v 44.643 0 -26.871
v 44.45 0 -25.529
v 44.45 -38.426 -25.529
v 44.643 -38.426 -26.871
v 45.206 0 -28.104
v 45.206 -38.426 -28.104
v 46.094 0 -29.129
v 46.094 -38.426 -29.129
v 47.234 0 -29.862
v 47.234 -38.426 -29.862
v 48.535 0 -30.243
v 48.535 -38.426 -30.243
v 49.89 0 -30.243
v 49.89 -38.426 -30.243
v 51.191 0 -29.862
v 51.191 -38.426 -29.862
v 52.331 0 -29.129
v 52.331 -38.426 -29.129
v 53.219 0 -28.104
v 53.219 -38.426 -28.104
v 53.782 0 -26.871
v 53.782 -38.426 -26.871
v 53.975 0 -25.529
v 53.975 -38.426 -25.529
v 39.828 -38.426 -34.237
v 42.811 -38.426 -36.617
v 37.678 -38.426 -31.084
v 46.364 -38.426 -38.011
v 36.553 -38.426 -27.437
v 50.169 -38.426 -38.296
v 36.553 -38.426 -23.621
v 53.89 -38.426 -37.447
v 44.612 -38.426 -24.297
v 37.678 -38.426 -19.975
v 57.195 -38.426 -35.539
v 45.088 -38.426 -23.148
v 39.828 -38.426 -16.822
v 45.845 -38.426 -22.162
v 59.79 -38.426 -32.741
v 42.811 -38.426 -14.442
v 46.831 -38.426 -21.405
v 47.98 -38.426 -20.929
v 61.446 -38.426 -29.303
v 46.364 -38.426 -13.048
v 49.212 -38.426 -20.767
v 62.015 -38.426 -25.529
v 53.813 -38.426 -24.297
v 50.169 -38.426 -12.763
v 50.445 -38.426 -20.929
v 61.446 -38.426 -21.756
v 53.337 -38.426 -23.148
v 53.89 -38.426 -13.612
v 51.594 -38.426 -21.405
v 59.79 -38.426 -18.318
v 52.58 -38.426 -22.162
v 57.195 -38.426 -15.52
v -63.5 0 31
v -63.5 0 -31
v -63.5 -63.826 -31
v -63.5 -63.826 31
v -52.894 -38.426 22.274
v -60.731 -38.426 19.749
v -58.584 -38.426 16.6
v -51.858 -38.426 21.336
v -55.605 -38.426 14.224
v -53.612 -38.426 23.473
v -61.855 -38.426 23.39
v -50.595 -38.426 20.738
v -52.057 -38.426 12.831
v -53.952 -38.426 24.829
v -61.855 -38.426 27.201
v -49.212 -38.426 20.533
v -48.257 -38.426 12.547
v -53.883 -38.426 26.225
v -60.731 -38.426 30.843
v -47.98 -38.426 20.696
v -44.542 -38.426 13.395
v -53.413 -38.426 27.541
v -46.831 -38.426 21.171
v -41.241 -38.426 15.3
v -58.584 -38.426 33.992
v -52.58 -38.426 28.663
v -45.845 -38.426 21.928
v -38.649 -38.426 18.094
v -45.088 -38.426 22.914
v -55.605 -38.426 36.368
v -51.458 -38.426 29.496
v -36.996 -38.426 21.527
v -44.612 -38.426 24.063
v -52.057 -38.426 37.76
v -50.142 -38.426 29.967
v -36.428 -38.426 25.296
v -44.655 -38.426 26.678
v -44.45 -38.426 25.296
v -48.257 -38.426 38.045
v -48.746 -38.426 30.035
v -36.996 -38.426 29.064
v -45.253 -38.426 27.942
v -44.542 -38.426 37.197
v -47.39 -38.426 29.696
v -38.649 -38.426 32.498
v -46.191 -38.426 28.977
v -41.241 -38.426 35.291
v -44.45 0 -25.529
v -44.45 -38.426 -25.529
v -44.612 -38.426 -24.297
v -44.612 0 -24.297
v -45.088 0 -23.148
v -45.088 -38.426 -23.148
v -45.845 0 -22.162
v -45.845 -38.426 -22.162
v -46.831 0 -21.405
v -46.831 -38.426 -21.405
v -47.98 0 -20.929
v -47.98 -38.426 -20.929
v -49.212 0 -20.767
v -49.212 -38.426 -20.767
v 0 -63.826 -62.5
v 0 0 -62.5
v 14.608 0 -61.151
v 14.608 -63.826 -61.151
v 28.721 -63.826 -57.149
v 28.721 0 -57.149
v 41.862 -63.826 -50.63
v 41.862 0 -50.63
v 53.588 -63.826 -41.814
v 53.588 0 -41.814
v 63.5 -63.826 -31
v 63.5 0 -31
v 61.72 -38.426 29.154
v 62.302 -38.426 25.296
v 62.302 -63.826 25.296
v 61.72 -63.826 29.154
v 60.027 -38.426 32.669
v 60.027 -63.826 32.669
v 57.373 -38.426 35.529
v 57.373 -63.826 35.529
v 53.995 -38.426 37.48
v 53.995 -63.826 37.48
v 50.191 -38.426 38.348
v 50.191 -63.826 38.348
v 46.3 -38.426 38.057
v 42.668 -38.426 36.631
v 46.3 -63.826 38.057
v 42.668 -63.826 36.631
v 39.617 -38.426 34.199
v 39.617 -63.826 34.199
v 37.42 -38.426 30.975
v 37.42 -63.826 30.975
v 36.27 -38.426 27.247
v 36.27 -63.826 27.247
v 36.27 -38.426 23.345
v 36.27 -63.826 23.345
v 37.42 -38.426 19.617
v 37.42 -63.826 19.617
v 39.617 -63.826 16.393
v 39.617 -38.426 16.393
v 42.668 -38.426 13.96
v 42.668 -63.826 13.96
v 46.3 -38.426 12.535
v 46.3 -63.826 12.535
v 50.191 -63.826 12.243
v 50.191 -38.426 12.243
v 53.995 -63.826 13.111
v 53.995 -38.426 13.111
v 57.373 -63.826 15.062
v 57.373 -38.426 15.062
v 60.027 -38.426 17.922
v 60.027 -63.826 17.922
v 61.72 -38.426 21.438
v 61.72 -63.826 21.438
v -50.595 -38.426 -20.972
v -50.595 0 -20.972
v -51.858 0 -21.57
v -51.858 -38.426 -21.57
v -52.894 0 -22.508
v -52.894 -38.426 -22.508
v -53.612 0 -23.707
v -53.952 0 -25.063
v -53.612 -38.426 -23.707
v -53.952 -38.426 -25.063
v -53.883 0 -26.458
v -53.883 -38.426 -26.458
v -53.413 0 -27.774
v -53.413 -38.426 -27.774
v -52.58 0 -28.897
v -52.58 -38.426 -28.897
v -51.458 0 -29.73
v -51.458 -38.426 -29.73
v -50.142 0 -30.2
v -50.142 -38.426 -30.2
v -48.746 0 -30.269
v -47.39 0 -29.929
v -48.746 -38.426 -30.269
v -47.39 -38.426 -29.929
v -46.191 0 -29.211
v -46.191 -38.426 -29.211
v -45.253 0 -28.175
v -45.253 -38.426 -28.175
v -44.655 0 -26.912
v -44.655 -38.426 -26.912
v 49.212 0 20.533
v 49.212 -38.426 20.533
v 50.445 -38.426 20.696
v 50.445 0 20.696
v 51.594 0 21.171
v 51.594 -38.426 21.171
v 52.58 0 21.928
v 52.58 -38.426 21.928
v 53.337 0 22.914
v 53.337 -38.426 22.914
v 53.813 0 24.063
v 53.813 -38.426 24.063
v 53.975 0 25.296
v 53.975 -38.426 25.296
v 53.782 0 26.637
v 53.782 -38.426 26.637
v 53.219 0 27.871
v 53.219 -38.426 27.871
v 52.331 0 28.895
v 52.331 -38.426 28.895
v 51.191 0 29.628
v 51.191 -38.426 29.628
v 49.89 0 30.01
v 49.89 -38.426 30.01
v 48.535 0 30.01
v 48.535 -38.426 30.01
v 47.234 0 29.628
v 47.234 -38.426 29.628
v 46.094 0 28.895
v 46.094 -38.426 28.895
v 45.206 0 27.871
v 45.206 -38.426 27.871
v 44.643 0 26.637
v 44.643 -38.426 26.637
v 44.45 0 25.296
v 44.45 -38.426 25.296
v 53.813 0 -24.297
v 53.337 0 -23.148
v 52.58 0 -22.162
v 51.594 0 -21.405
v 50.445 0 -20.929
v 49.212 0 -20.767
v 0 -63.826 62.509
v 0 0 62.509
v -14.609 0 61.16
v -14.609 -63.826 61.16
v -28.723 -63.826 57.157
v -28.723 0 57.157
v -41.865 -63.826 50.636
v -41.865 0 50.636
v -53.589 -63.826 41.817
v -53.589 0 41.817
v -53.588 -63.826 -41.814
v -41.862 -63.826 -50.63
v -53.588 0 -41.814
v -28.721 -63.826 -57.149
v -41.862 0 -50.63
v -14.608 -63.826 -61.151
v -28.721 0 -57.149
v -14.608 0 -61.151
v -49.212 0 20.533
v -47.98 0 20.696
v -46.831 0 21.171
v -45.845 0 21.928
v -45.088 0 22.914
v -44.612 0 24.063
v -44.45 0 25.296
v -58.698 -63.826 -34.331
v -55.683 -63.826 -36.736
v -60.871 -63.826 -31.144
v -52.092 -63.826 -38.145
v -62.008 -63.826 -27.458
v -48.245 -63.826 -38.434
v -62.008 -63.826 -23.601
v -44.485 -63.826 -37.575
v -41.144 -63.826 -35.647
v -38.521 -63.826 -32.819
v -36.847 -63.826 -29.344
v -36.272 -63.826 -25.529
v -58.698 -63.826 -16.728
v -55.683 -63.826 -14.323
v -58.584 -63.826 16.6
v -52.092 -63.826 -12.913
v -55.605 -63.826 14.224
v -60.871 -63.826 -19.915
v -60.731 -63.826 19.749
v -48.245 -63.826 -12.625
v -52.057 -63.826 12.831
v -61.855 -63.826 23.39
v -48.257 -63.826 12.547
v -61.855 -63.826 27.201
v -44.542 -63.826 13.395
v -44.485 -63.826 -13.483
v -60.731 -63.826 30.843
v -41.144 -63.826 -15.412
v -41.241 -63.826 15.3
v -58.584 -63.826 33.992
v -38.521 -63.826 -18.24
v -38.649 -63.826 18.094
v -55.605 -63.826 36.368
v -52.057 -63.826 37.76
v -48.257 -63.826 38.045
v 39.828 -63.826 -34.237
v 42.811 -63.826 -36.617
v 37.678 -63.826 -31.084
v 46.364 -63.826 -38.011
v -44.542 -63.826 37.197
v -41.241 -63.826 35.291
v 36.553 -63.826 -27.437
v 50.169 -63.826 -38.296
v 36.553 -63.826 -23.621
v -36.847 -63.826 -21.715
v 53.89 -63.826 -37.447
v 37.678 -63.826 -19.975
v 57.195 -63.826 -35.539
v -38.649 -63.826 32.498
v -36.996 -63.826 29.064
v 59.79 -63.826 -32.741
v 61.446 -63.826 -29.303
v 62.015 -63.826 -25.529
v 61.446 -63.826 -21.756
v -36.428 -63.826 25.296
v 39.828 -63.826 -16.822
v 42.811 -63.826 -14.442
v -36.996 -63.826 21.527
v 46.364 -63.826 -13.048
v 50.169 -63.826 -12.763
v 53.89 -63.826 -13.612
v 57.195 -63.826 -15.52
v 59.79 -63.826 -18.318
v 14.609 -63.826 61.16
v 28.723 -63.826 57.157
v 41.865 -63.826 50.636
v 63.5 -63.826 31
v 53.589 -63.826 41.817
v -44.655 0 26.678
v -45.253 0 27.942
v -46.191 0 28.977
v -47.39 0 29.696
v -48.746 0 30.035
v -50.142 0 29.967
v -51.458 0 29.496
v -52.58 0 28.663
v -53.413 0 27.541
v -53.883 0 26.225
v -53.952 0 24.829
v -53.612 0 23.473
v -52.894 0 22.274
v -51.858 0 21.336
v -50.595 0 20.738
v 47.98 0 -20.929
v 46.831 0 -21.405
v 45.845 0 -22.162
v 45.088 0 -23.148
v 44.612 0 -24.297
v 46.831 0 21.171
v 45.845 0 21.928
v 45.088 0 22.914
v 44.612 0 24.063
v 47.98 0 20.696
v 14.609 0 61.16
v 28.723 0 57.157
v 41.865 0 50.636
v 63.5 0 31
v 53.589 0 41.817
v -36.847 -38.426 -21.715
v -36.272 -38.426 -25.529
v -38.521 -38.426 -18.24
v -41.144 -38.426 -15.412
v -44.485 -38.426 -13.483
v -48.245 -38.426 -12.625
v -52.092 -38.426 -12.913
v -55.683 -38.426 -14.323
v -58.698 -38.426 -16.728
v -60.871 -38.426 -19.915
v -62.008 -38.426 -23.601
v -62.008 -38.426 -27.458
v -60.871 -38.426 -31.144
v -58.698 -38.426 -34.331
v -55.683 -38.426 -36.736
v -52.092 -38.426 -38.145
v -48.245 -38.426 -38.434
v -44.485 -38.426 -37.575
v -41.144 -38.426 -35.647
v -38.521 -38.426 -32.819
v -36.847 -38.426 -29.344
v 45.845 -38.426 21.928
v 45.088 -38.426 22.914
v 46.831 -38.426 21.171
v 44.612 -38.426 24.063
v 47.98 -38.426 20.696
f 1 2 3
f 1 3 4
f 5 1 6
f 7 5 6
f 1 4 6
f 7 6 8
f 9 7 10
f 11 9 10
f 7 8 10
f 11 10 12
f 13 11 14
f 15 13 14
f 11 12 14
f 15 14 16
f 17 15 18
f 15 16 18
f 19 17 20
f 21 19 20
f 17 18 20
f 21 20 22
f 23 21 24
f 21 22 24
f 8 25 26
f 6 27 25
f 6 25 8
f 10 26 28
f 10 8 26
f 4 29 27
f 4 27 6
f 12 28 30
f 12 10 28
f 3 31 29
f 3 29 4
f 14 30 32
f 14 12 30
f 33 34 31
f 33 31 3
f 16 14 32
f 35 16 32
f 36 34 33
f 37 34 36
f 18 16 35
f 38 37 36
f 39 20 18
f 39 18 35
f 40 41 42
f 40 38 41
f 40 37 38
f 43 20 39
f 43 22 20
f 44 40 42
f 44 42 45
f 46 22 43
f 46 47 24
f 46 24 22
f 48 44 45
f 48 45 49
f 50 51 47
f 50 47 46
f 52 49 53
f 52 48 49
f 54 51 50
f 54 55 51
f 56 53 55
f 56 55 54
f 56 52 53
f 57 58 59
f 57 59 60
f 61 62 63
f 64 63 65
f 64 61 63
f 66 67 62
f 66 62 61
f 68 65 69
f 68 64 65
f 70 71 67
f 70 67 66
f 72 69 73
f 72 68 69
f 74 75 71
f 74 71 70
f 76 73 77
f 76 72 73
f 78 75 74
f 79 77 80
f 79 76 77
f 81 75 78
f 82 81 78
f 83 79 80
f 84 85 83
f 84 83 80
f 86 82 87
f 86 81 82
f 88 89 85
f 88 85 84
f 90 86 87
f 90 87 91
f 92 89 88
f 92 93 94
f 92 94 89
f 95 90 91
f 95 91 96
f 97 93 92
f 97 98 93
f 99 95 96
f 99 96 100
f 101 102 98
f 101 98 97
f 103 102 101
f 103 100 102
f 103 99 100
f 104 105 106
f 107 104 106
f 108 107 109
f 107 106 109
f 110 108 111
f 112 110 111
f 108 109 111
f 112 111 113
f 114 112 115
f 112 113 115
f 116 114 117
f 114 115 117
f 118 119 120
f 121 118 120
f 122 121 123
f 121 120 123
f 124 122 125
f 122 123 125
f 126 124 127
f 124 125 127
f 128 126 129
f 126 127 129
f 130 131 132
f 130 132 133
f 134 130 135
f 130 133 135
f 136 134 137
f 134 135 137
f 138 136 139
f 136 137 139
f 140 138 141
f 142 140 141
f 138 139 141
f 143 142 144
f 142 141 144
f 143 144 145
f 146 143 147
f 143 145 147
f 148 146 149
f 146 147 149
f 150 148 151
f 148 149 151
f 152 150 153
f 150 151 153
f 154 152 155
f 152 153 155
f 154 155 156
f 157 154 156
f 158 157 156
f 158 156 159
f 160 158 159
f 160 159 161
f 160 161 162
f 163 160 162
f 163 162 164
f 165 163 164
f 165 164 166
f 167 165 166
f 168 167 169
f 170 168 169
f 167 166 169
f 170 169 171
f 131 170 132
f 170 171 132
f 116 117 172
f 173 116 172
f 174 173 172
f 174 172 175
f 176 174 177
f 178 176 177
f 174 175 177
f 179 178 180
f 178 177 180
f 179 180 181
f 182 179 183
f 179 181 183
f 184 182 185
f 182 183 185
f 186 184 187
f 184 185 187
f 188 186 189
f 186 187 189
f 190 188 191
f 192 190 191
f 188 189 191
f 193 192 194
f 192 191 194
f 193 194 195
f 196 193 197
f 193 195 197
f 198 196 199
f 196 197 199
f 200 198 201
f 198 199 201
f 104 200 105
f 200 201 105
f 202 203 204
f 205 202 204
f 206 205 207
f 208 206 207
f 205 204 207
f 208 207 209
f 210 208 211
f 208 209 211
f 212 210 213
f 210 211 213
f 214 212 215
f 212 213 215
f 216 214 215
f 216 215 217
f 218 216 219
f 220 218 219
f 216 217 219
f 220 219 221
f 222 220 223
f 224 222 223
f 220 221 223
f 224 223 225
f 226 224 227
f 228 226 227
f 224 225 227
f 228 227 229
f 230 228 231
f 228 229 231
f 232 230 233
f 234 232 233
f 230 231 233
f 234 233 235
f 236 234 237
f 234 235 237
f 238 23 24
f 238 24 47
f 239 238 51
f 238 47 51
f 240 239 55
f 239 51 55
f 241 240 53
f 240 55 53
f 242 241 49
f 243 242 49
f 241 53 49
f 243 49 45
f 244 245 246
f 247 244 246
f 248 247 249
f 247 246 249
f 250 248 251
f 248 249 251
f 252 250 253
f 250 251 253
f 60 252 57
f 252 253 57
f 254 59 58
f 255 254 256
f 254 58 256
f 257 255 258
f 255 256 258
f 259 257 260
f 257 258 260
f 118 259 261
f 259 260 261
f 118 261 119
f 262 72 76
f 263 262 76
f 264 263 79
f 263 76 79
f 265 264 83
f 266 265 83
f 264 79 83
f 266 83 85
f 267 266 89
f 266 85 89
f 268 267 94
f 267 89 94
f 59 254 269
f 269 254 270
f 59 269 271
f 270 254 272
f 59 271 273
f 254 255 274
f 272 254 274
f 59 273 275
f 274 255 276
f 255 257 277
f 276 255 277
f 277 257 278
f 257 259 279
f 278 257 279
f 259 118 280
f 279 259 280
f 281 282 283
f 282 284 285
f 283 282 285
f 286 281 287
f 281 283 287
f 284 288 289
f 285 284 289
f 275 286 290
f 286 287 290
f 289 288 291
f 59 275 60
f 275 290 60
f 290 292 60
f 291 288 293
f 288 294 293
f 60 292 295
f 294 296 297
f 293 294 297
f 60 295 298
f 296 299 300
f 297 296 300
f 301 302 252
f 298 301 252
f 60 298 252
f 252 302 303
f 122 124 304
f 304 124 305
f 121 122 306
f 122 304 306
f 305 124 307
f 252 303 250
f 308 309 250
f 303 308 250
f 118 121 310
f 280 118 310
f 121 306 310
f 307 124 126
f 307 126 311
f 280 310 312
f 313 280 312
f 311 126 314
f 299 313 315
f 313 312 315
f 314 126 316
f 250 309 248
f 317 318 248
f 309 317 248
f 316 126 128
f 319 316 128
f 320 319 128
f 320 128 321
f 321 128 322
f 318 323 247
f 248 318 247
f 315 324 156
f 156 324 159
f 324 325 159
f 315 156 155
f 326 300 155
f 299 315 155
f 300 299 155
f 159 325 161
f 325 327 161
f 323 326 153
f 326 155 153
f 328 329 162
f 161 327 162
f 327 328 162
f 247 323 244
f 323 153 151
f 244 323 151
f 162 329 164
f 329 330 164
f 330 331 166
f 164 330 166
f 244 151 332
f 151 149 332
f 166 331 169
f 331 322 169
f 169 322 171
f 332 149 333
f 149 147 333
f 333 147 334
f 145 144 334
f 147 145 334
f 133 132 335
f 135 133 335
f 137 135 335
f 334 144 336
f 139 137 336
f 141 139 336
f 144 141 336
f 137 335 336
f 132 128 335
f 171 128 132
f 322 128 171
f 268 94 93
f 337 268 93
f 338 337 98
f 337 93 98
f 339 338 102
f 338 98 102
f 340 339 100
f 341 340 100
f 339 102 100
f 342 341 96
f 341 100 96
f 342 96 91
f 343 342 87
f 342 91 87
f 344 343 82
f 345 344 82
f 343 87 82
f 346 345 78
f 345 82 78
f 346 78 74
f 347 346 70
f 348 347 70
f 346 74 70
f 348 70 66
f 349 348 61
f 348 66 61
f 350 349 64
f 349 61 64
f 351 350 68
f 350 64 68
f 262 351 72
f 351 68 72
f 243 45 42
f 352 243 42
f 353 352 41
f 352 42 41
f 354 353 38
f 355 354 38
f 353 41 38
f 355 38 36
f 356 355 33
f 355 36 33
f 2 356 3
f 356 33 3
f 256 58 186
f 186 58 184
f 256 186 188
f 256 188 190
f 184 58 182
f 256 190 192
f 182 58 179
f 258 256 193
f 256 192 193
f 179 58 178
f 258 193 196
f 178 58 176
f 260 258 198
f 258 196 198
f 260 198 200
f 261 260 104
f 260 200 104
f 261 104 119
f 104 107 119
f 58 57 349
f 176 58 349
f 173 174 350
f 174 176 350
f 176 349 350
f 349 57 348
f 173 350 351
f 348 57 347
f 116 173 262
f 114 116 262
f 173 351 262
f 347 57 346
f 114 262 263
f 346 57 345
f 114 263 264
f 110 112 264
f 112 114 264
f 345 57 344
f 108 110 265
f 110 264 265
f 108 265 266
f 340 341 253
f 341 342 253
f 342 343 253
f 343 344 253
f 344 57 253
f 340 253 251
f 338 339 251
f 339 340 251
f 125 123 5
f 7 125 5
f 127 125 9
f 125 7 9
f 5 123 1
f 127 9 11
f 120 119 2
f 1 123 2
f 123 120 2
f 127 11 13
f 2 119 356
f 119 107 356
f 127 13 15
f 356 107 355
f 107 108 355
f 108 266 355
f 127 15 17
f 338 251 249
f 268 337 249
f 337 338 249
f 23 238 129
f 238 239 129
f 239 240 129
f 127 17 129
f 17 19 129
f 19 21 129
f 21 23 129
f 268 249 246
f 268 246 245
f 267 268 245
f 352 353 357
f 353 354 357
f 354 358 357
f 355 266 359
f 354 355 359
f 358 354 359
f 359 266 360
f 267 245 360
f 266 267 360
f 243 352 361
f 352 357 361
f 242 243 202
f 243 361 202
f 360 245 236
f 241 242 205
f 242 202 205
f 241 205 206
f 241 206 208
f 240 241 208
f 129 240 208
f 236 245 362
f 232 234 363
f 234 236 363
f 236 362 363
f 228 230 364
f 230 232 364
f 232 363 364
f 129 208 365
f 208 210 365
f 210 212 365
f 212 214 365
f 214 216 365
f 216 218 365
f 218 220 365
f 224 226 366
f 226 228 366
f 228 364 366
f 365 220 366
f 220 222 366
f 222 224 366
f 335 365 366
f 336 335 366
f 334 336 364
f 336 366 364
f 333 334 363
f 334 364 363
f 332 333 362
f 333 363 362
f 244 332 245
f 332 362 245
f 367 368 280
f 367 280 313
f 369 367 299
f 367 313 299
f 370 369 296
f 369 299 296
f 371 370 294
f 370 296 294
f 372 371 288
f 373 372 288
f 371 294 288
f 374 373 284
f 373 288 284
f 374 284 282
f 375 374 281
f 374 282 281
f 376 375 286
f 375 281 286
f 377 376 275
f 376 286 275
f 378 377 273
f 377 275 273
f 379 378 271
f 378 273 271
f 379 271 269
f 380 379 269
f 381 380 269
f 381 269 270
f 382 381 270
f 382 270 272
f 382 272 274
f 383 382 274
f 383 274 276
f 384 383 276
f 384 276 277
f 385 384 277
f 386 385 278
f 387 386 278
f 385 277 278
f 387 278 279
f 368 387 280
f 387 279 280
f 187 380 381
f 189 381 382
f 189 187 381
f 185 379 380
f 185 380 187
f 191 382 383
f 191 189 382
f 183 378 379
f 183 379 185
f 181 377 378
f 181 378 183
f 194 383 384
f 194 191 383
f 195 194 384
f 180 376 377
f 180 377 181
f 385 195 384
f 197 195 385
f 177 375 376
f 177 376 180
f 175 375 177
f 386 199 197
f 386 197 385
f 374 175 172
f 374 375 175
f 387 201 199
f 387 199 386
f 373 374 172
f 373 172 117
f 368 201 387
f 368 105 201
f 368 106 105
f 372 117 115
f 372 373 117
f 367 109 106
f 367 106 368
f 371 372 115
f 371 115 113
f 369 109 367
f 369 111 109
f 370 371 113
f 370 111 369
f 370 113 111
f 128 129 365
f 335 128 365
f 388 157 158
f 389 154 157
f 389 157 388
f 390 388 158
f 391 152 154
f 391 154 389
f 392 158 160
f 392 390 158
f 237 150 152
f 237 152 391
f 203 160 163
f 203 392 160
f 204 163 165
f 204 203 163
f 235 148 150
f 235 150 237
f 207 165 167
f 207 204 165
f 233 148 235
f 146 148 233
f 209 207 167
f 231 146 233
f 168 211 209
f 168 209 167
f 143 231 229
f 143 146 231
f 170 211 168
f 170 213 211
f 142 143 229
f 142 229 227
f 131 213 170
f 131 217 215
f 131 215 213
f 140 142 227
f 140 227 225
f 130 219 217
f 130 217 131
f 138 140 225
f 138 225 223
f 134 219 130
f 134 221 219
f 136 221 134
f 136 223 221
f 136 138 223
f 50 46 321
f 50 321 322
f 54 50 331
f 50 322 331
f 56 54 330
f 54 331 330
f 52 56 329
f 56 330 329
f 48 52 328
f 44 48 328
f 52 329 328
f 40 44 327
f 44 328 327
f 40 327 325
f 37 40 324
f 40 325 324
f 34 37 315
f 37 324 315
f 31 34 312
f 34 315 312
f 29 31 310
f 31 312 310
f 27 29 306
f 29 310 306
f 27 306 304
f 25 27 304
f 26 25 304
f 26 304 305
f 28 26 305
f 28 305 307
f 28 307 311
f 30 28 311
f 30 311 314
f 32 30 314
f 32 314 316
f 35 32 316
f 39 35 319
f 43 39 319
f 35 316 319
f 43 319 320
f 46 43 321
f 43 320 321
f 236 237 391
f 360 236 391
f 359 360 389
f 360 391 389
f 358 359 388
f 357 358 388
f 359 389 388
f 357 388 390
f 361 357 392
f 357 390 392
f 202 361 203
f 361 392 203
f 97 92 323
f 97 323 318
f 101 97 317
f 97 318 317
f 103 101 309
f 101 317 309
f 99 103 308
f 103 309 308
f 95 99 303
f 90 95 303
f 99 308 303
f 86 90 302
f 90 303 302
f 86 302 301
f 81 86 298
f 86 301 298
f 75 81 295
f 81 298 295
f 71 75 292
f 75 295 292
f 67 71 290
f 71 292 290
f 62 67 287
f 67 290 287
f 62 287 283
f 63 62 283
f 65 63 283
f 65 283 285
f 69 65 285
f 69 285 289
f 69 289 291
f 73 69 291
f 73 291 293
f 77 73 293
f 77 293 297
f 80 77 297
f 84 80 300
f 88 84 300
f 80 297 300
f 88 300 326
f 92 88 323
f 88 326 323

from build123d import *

# Parameters (mm, degrees)
F1_DEPTH  = 104.5
F3_DEPTH  = 127.001
F4_W      = 127
F4_H      = 62
F5_DEPTH  = 27
F7_DEPTH  = 93.5104
F8_W      = 78.298144
F8_H      = 207.146659
F9_DEPTH  = 127.001
F11_DEPTH = 63.827166
F12_R     = 12.802334
F12_R_2   = 12.940418
F12_R_3   = 12.784861
F12_R_4   = 13.089145
F13_DEPTH = 25.4


with BuildPart() as f1:
    # F0 (on Front) → F1 (new body)
    with BuildSketch(Plane.XZ):
        with BuildLine():
            ThreePointArc((0, 62.5094), (-35.443943, 54.198998), (-63.5, 31))
            Line((-63.5, 31), (0, 31))
            Line((0, 31), (0, 62.5094))
        make_face()
        Polygon((0, 31), (-63.5, 31), (-63.5, -31), (0, -31), (0, 0), align=None)
        with BuildLine():
            Line((0, 62.5094), (0, 31))
            Line((0, 31), (63.5, 31))
            ThreePointArc((63.5, 31), (35.443943, 54.198998), (0, 62.5094))
        make_face()
        Polygon((63.5, 31), (0, 31), (0, 0), (0, -31), (63.5, -31), align=None)
        with BuildLine():
            Line((0, -31), (-63.5, -31))
            ThreePointArc((-63.5, -31), (-35.441854, -54.192308), (0, -62.5))
            Line((0, -62.5), (0, -31))
        make_face()
        with BuildLine():
            Line((63.5, -31), (0, -31))
            Line((0, -31), (0, -62.5))
            ThreePointArc((0, -62.5), (35.441854, -54.192308), (63.5, -31))
        make_face()
    extrude(amount=F1_DEPTH)

    # F2 (on face) → F3 (cut, through all)
    with BuildSketch(Plane.YZ.offset(63.5)):
        Polygon((-104.5, 72.844587), (-104.5, 31), (-62.5, 64.333223), align=None)
        Polygon((-62.5, -65.093011), (-104.5, -31), (-104.5, -67.313612), align=None)
    extrude(amount=-F3_DEPTH, mode=Mode.SUBTRACT)

    # F4 (on face) → F5 (join)
    with BuildSketch(Plane.XZ.offset(104.5)):
        Rectangle(F4_W, F4_H)
    extrude(amount=F5_DEPTH)

    # F6 (on face) → F7 (cut, through all)
    with BuildSketch(Plane(origin=(0, 0, -31), x_dir=(1, 0, 0), z_dir=(0, 0, -1))):
        with BuildLine():
            ThreePointArc((-63.5, 104.5), (-34.500906, 124.469723), (0, 131.5))
            Line((0, 131.5), (-63.5, 131.5))
            Line((-63.5, 131.5), (-63.5, 104.5))
        make_face()
        with BuildLine():
            ThreePointArc((0, 131.5), (34.500906, 124.469723), (63.5, 104.5))
            Line((63.5, 104.5), (63.5, 131.5))
            Line((63.5, 131.5), (0, 131.5))
        make_face()
    extrude(amount=-F7_DEPTH, mode=Mode.SUBTRACT)

    # F8 (on face) → F9 (cut, through all)
    with BuildSketch(Plane.YZ.offset(63.5)):
        with Locations((-102.975238, -5.202033)):
            Rectangle(F8_W, F8_H)
    extrude(amount=-F9_DEPTH, mode=Mode.SUBTRACT)

    # F10 (on face) → F11 (cut, through all)
    with BuildSketch(Plane.XZ.offset(63.826166)):
        with BuildLine():
            ThreePointArc((53.975, -25.529381), (52.580096, -22.161785), (49.2125, -20.766881))
            Line((49.2125, -20.766881), (49.2125, -25.529381))
            Line((49.2125, -25.529381), (44.45, -25.529381))
            ThreePointArc((44.45, -25.529381), (49.2125, -30.291881), (53.975, -25.529381))
        make_face()
        with BuildLine():
            Line((49.2125, -25.529381), (49.2125, -20.766881))
            ThreePointArc((49.2125, -20.766881), (45.844904, -22.161785), (44.45, -25.529381))
            Line((44.45, -25.529381), (49.2125, -25.529381))
        make_face()
        with BuildLine():
            Line((-49.2125, -25.529381), (-49.2125, -20.766881))
            ThreePointArc((-49.2125, -20.766881), (-52.580096, -28.896977), (-44.45, -25.529381))
            Line((-44.45, -25.529381), (-49.2125, -25.529381))
        make_face()
        with BuildLine():
            ThreePointArc((-44.45, -25.529381), (-45.844904, -22.161785), (-49.2125, -20.766881))
            Line((-49.2125, -20.766881), (-49.2125, -25.529381))
            Line((-49.2125, -25.529381), (-44.45, -25.529381))
        make_face()
        with BuildLine():
            ThreePointArc((-44.45, 25.295729), (-52.580096, 28.663325), (-49.2125, 20.533229))
            Line((-49.2125, 20.533229), (-49.2125, 25.295729))
            Line((-49.2125, 25.295729), (-44.45, 25.295729))
        make_face()
        with BuildLine():
            Line((-49.2125, 25.295729), (-49.2125, 20.533229))
            ThreePointArc((-49.2125, 20.533229), (-45.844904, 21.928133), (-44.45, 25.295729))
            Line((-44.45, 25.295729), (-49.2125, 25.295729))
        make_face()
        with BuildLine():
            ThreePointArc((44.45, 25.295729), (45.844904, 21.928133), (49.2125, 20.533229))
            Line((49.2125, 20.533229), (49.2125, 25.295729))
            Line((49.2125, 25.295729), (44.45, 25.295729))
        make_face()
        with BuildLine():
            Line((49.2125, 25.295729), (49.2125, 20.533229))
            ThreePointArc((49.2125, 20.533229), (52.580096, 21.928133), (53.975, 25.295729))
            ThreePointArc((53.975, 25.295729), (49.2125, 30.058229), (44.45, 25.295729))
            Line((44.45, 25.295729), (49.2125, 25.295729))
        make_face()
    extrude(amount=-F11_DEPTH, mode=Mode.SUBTRACT)

    # F12 (on face) → F13 (cut)
    with BuildSketch(Plane.XZ.offset(63.826166)):
        with Locations((49.2125, -25.529381)):
            Circle(F12_R)
        with Locations((-49.2125, -25.529381)):
            Circle(F12_R_2)
        with Locations((-49.2125, 25.295729)):
            Circle(F12_R_3)
        with Locations((49.2125, 25.295729)):
            Circle(F12_R_4)
    extrude(amount=-F13_DEPTH, mode=Mode.SUBTRACT)


solid = f1.part
